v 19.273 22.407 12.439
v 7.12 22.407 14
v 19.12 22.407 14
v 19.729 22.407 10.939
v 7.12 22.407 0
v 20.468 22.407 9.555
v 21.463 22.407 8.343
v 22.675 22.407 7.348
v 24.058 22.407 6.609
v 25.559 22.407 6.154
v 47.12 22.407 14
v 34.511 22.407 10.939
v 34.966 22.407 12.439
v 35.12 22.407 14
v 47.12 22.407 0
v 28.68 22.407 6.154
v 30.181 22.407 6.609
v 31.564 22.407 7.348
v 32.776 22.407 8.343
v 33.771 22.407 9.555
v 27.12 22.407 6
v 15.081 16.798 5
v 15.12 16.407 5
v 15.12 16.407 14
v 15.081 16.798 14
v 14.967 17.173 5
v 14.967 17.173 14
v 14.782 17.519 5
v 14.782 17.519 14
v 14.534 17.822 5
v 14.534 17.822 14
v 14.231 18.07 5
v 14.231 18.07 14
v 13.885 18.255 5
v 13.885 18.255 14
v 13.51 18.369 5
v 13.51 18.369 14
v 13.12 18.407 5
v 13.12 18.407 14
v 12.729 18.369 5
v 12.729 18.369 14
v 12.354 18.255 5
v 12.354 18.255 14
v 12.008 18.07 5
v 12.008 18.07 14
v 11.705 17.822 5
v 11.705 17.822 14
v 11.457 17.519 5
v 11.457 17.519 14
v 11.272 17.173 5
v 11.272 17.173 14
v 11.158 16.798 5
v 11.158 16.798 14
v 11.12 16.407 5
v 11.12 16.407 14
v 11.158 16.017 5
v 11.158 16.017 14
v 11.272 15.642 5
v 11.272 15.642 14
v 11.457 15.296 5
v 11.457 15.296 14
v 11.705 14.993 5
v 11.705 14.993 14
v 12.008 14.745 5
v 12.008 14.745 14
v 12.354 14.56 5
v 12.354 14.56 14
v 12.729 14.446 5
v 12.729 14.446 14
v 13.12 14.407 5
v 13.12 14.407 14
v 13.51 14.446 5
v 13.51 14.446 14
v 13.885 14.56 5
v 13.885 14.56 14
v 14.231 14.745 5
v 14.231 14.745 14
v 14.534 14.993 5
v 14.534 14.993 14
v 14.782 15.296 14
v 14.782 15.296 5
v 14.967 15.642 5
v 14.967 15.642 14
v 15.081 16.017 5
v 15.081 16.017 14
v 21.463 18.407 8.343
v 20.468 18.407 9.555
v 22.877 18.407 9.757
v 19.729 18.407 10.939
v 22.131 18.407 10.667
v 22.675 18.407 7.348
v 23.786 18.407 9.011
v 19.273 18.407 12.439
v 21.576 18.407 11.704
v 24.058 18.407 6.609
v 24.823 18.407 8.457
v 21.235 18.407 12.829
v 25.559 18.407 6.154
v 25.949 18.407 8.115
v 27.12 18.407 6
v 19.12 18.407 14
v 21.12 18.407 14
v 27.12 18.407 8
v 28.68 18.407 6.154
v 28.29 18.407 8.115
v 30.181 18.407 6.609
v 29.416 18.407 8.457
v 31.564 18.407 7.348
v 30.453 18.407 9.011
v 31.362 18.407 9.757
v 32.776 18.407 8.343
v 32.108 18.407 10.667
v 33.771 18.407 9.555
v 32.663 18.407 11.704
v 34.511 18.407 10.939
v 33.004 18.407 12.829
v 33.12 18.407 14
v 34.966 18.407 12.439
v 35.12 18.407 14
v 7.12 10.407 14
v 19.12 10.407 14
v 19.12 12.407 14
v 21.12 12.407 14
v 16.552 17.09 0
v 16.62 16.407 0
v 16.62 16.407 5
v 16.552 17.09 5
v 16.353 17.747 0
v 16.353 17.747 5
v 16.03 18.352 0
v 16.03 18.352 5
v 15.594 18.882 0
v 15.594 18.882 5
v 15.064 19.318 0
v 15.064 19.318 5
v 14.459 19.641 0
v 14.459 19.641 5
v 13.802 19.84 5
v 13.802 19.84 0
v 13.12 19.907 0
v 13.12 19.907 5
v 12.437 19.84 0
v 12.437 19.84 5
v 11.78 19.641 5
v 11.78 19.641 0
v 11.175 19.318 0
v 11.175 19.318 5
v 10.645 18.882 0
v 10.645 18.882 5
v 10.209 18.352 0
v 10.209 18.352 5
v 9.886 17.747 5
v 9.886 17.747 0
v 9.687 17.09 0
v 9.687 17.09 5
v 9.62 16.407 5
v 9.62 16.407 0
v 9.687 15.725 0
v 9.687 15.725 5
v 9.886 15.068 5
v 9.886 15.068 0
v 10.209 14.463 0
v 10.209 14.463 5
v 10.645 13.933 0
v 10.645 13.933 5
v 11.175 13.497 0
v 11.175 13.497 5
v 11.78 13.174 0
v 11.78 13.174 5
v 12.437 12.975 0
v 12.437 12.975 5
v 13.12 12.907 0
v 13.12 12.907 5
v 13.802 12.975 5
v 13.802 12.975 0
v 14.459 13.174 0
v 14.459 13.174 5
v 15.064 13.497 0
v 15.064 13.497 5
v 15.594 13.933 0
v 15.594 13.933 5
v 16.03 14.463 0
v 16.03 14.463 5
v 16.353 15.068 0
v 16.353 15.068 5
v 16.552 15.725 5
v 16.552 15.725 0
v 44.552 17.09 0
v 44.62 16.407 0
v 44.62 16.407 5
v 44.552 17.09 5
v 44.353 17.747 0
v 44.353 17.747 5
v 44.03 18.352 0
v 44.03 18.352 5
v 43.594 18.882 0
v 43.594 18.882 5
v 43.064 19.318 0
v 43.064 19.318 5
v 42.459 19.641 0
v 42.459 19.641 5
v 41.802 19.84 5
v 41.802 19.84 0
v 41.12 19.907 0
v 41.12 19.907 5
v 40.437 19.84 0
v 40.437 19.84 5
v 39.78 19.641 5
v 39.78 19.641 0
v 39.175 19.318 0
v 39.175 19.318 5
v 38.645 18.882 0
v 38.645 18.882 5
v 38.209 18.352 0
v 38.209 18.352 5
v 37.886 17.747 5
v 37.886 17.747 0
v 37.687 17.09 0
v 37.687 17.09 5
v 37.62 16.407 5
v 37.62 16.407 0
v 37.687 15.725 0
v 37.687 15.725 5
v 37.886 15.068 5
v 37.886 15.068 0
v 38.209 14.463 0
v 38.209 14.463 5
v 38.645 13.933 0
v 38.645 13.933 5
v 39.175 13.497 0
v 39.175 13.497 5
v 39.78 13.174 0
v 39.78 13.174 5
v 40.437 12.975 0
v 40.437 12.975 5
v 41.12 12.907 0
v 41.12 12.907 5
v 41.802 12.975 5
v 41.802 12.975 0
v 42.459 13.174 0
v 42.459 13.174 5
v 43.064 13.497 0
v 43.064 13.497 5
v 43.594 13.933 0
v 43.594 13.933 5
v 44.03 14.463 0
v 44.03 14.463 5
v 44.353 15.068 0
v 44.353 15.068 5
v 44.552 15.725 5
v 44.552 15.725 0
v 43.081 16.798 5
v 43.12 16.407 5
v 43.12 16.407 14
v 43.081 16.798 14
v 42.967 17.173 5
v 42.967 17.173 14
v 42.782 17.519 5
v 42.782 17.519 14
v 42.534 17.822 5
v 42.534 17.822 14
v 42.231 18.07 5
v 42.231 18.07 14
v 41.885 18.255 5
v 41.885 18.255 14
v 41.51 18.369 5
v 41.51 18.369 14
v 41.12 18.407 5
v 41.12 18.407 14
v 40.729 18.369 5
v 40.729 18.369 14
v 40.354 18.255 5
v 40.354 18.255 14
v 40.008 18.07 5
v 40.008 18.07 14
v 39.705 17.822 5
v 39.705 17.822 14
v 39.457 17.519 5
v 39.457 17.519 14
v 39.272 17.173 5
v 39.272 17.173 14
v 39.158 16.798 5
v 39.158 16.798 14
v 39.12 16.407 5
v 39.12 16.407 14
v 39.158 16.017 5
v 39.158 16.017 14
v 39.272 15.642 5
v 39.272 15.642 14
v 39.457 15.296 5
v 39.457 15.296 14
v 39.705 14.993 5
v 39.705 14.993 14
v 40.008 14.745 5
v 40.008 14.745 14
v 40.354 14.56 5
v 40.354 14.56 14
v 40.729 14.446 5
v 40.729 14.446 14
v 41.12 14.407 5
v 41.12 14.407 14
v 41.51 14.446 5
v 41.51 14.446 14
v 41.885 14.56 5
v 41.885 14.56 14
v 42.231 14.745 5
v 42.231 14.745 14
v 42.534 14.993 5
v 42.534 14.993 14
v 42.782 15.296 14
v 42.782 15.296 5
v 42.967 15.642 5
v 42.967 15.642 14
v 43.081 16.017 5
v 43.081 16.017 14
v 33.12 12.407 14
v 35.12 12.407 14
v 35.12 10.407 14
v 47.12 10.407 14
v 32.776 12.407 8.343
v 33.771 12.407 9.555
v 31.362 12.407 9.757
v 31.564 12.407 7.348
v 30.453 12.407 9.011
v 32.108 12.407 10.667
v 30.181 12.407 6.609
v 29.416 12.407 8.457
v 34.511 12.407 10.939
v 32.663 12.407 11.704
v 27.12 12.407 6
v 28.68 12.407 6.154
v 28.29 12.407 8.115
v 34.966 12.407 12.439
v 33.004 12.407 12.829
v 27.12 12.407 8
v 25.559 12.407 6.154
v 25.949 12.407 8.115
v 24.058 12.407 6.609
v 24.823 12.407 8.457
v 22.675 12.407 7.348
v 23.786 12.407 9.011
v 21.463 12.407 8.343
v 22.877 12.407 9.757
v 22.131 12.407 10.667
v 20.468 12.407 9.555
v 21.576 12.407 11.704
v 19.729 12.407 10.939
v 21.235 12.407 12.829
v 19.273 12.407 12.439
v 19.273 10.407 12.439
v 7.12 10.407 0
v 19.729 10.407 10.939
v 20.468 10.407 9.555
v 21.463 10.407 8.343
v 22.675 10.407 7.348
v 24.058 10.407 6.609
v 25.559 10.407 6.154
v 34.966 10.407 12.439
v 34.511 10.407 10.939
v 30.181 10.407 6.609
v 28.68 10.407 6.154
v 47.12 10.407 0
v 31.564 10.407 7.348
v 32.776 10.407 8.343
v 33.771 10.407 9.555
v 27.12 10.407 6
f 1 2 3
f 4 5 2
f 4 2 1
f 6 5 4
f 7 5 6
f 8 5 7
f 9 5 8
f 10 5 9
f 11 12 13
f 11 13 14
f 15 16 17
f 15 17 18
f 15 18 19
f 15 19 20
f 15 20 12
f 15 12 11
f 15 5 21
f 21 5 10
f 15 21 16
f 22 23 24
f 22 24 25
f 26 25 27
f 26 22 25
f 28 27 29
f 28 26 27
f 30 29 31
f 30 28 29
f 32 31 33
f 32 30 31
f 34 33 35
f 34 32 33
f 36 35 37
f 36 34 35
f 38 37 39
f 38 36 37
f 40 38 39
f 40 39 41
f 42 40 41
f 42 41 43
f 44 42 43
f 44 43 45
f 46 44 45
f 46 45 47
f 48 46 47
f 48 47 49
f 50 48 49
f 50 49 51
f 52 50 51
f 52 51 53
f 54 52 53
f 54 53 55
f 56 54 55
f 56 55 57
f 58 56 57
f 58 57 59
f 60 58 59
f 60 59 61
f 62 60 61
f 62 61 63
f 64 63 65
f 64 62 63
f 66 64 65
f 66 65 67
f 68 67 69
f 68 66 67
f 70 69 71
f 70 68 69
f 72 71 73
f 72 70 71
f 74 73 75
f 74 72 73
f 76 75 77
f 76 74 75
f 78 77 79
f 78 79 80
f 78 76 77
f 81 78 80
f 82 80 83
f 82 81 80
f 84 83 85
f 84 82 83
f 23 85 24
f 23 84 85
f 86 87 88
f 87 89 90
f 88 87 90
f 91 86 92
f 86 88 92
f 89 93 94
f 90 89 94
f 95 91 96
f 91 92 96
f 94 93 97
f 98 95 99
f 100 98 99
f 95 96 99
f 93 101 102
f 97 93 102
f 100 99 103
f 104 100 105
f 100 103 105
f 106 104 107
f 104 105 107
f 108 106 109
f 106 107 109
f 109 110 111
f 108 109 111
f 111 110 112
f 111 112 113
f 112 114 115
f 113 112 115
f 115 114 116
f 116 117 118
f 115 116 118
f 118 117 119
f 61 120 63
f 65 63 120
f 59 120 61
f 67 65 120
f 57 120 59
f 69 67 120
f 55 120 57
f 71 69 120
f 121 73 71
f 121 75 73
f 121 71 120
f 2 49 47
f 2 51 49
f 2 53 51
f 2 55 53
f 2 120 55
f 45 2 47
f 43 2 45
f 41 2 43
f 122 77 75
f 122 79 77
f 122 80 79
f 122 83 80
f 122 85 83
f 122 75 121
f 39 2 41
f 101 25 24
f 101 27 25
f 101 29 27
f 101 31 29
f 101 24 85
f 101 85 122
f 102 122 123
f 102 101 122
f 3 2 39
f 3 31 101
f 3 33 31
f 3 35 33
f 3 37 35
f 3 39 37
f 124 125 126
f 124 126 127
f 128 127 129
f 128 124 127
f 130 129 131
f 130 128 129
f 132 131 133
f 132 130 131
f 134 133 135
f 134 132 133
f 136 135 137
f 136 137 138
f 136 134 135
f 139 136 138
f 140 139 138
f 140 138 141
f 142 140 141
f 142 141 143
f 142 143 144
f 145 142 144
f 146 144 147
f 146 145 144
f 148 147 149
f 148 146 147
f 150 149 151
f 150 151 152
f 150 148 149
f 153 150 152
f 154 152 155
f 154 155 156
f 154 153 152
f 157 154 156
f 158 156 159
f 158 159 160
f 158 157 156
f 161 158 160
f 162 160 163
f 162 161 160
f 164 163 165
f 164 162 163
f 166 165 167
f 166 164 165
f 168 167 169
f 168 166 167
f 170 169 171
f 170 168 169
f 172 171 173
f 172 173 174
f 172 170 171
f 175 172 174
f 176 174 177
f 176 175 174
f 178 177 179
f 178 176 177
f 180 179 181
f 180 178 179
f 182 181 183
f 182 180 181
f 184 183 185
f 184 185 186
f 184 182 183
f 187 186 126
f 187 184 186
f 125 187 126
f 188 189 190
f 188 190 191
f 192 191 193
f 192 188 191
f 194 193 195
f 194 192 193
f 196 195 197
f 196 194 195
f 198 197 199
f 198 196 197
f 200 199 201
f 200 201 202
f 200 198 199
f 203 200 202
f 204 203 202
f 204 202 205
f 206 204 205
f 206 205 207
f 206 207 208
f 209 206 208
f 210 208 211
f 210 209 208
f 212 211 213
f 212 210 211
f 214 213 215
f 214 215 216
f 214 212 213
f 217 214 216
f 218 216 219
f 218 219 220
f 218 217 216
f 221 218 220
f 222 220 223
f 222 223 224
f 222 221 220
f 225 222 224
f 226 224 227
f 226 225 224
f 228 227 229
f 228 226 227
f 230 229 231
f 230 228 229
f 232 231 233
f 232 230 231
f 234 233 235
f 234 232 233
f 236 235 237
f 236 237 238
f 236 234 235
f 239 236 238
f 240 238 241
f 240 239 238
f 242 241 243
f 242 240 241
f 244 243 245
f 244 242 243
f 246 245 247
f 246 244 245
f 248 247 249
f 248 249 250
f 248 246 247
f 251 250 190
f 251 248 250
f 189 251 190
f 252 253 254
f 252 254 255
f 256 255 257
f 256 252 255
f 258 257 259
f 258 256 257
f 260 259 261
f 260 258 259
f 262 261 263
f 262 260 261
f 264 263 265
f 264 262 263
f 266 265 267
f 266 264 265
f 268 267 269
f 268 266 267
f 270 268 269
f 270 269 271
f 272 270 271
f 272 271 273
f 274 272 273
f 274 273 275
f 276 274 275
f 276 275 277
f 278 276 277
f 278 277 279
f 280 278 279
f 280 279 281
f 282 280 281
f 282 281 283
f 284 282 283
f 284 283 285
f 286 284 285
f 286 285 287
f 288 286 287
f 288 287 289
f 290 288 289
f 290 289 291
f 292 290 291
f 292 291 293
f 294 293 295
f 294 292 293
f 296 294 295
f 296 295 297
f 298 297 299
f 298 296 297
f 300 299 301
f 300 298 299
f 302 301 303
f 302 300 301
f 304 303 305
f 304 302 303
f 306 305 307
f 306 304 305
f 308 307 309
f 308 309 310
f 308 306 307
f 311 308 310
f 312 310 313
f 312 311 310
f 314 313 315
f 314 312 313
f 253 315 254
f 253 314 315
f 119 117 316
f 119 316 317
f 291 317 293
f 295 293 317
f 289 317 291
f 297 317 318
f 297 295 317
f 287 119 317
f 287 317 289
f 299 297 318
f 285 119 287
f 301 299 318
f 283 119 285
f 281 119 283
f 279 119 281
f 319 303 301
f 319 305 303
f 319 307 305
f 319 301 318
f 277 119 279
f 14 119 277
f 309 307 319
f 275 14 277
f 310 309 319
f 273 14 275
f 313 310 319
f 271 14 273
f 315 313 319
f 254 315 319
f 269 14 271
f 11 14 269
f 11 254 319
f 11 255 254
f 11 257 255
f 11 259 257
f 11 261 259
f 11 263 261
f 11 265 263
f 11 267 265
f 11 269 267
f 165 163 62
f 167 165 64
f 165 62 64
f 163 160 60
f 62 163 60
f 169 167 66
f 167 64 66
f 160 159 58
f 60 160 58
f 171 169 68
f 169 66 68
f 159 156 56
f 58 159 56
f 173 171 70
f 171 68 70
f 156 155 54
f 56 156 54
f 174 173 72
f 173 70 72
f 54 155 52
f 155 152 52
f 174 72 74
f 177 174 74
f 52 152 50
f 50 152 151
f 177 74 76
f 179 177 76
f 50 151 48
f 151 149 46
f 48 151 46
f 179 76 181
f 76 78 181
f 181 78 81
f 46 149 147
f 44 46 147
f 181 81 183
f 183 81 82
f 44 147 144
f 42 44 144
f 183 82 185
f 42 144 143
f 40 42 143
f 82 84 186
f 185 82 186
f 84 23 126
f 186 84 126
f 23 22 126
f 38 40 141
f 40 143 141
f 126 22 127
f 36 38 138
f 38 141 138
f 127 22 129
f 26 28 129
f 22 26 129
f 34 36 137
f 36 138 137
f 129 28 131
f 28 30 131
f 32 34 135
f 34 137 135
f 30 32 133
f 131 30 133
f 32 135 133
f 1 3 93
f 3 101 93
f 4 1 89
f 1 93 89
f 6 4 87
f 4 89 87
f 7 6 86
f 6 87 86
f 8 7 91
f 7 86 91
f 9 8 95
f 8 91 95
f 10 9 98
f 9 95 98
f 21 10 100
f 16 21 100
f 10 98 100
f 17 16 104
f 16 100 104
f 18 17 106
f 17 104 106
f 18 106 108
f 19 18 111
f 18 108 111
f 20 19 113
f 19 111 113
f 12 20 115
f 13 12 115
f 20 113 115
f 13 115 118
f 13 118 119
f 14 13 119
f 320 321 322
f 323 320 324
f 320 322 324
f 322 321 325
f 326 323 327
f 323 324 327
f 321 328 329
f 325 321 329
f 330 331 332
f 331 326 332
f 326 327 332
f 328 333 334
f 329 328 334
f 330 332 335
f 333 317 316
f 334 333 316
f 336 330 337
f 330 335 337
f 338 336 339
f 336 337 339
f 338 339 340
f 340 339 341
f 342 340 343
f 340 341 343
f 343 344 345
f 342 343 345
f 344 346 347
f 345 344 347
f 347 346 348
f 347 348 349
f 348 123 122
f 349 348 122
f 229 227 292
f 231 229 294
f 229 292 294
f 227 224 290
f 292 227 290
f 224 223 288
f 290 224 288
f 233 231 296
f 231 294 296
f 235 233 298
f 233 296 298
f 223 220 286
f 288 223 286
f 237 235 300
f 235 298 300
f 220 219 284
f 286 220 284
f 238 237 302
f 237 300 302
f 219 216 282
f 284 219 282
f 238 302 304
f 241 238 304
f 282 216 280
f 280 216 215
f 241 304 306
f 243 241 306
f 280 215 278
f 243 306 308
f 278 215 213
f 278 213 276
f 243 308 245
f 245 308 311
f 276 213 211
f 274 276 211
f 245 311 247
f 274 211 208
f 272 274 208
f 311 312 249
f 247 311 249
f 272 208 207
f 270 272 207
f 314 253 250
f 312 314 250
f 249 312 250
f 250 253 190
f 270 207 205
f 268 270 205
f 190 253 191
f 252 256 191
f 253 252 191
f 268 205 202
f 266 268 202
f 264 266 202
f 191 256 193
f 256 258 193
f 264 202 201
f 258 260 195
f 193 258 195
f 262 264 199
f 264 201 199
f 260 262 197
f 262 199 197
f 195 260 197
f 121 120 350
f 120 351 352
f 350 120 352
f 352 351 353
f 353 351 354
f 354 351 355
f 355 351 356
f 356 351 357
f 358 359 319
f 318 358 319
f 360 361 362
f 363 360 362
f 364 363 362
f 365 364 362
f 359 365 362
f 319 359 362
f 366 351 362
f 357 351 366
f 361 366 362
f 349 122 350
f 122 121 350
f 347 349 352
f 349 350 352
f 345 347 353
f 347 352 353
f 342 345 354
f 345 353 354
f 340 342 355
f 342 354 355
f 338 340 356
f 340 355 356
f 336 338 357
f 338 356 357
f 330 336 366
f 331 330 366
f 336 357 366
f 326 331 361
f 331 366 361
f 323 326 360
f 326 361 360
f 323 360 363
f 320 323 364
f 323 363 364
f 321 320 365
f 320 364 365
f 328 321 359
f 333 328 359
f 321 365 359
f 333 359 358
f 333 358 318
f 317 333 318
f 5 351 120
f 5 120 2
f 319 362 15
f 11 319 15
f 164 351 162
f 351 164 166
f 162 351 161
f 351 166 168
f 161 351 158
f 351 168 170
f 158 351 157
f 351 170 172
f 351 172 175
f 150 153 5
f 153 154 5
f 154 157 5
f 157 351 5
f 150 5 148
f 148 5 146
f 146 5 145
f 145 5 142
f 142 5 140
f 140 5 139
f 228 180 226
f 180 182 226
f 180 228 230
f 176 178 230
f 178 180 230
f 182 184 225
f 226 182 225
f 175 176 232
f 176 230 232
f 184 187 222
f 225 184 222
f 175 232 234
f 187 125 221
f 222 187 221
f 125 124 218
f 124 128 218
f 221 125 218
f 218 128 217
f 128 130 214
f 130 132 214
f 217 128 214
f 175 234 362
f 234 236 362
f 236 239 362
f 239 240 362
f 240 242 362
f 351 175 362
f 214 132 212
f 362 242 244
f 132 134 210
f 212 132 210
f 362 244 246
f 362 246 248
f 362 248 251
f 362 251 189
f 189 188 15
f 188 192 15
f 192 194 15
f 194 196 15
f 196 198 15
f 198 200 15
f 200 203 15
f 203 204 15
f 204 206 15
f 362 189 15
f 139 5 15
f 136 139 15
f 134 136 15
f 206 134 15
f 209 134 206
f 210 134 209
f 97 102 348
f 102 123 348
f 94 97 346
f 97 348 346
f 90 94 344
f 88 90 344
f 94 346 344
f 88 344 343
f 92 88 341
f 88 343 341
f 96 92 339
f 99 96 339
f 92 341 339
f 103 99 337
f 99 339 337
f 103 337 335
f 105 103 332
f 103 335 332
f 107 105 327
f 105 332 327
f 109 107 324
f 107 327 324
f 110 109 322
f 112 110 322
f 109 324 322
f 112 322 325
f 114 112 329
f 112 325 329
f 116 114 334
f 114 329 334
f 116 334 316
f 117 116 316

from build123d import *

# Parameters (mm, degrees)
SKETCH1_W           = 40
SKETCH1_H           = 12
SKETCH1_R           = 2
BOSS_EXTRUDE1_DEPTH = 14
SKETCH2_R           = 3.5
CUT_EXTRUDE1_DEPTH  = 5


with BuildPart() as part:
    # Sketch1 → Boss-Extrude1 (new body)
    with BuildSketch(Plane.XY):
        with Locations((27.119550003, 16.407464025)):
            Rectangle(SKETCH1_W, SKETCH1_H)
        with Locations((13.119550003, 16.407464025)):
            Circle(SKETCH1_R, mode=Mode.SUBTRACT)
        with Locations((41.119550003, 16.407464025)):
            Circle(SKETCH1_R, mode=Mode.SUBTRACT)
    extrude(amount=BOSS_EXTRUDE1_DEPTH)

    # Sketch2 → Cut-Extrude1 (cut)
    with BuildSketch(Plane.XY):
        with Locations((13.119550003, 16.407464025)):
            Circle(SKETCH2_R)
        with Locations((41.119550003, 16.407464025)):
            Circle(SKETCH2_R)
    extrude(amount=CUT_EXTRUDE1_DEPTH, mode=Mode.SUBTRACT)

    # Sketch3 → Cut-Revolve1 (revolve, cut)
    with BuildSketch(Plane.XY.offset(14)):
        Polygon((35.119550003, 22.407464025), (35.119550003, 18.407464025), (33.119550003, 18.407464025), (33.119550003, 12.407464025), (35.119550003, 12.407464025), (35.119550003, 10.407464025), (27.119550003, 10.407464025), (27.119550003, 22.407464025), align=None)
    revolve(axis=Axis((27.119550003, 22.407464025, 14), (0, -1, 0)), mode=Mode.SUBTRACT)


solid = part.part
